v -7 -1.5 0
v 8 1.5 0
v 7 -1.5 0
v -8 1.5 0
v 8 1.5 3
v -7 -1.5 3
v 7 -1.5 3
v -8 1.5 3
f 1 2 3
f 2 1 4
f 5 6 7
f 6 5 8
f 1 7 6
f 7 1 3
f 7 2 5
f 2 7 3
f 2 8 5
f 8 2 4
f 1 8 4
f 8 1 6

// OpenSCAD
// Rectangular shaft key with chamfered ends.
$fn = 60;
eps = 0.02;
key_w = 3;
key_h = 3;
key_l = 16;
chamfer = 1;
polyhedron(points = [
    [-key_l / 2 + chamfer, -key_w / 2, 0], [key_l / 2 - chamfer, -key_w / 2, 0], [key_l / 2, key_w / 2, 0], [-key_l / 2, key_w / 2, 0],
    [-key_l / 2 + chamfer, -key_w / 2, key_h], [key_l / 2 - chamfer, -key_w / 2, key_h], [key_l / 2, key_w / 2, key_h], [-key_l / 2, key_w / 2, key_h]
], faces = [[0,1,2,3],[4,7,6,5],[0,4,5,1],[1,5,6,2],[2,6,7,3],[3,7,4,0]]);
